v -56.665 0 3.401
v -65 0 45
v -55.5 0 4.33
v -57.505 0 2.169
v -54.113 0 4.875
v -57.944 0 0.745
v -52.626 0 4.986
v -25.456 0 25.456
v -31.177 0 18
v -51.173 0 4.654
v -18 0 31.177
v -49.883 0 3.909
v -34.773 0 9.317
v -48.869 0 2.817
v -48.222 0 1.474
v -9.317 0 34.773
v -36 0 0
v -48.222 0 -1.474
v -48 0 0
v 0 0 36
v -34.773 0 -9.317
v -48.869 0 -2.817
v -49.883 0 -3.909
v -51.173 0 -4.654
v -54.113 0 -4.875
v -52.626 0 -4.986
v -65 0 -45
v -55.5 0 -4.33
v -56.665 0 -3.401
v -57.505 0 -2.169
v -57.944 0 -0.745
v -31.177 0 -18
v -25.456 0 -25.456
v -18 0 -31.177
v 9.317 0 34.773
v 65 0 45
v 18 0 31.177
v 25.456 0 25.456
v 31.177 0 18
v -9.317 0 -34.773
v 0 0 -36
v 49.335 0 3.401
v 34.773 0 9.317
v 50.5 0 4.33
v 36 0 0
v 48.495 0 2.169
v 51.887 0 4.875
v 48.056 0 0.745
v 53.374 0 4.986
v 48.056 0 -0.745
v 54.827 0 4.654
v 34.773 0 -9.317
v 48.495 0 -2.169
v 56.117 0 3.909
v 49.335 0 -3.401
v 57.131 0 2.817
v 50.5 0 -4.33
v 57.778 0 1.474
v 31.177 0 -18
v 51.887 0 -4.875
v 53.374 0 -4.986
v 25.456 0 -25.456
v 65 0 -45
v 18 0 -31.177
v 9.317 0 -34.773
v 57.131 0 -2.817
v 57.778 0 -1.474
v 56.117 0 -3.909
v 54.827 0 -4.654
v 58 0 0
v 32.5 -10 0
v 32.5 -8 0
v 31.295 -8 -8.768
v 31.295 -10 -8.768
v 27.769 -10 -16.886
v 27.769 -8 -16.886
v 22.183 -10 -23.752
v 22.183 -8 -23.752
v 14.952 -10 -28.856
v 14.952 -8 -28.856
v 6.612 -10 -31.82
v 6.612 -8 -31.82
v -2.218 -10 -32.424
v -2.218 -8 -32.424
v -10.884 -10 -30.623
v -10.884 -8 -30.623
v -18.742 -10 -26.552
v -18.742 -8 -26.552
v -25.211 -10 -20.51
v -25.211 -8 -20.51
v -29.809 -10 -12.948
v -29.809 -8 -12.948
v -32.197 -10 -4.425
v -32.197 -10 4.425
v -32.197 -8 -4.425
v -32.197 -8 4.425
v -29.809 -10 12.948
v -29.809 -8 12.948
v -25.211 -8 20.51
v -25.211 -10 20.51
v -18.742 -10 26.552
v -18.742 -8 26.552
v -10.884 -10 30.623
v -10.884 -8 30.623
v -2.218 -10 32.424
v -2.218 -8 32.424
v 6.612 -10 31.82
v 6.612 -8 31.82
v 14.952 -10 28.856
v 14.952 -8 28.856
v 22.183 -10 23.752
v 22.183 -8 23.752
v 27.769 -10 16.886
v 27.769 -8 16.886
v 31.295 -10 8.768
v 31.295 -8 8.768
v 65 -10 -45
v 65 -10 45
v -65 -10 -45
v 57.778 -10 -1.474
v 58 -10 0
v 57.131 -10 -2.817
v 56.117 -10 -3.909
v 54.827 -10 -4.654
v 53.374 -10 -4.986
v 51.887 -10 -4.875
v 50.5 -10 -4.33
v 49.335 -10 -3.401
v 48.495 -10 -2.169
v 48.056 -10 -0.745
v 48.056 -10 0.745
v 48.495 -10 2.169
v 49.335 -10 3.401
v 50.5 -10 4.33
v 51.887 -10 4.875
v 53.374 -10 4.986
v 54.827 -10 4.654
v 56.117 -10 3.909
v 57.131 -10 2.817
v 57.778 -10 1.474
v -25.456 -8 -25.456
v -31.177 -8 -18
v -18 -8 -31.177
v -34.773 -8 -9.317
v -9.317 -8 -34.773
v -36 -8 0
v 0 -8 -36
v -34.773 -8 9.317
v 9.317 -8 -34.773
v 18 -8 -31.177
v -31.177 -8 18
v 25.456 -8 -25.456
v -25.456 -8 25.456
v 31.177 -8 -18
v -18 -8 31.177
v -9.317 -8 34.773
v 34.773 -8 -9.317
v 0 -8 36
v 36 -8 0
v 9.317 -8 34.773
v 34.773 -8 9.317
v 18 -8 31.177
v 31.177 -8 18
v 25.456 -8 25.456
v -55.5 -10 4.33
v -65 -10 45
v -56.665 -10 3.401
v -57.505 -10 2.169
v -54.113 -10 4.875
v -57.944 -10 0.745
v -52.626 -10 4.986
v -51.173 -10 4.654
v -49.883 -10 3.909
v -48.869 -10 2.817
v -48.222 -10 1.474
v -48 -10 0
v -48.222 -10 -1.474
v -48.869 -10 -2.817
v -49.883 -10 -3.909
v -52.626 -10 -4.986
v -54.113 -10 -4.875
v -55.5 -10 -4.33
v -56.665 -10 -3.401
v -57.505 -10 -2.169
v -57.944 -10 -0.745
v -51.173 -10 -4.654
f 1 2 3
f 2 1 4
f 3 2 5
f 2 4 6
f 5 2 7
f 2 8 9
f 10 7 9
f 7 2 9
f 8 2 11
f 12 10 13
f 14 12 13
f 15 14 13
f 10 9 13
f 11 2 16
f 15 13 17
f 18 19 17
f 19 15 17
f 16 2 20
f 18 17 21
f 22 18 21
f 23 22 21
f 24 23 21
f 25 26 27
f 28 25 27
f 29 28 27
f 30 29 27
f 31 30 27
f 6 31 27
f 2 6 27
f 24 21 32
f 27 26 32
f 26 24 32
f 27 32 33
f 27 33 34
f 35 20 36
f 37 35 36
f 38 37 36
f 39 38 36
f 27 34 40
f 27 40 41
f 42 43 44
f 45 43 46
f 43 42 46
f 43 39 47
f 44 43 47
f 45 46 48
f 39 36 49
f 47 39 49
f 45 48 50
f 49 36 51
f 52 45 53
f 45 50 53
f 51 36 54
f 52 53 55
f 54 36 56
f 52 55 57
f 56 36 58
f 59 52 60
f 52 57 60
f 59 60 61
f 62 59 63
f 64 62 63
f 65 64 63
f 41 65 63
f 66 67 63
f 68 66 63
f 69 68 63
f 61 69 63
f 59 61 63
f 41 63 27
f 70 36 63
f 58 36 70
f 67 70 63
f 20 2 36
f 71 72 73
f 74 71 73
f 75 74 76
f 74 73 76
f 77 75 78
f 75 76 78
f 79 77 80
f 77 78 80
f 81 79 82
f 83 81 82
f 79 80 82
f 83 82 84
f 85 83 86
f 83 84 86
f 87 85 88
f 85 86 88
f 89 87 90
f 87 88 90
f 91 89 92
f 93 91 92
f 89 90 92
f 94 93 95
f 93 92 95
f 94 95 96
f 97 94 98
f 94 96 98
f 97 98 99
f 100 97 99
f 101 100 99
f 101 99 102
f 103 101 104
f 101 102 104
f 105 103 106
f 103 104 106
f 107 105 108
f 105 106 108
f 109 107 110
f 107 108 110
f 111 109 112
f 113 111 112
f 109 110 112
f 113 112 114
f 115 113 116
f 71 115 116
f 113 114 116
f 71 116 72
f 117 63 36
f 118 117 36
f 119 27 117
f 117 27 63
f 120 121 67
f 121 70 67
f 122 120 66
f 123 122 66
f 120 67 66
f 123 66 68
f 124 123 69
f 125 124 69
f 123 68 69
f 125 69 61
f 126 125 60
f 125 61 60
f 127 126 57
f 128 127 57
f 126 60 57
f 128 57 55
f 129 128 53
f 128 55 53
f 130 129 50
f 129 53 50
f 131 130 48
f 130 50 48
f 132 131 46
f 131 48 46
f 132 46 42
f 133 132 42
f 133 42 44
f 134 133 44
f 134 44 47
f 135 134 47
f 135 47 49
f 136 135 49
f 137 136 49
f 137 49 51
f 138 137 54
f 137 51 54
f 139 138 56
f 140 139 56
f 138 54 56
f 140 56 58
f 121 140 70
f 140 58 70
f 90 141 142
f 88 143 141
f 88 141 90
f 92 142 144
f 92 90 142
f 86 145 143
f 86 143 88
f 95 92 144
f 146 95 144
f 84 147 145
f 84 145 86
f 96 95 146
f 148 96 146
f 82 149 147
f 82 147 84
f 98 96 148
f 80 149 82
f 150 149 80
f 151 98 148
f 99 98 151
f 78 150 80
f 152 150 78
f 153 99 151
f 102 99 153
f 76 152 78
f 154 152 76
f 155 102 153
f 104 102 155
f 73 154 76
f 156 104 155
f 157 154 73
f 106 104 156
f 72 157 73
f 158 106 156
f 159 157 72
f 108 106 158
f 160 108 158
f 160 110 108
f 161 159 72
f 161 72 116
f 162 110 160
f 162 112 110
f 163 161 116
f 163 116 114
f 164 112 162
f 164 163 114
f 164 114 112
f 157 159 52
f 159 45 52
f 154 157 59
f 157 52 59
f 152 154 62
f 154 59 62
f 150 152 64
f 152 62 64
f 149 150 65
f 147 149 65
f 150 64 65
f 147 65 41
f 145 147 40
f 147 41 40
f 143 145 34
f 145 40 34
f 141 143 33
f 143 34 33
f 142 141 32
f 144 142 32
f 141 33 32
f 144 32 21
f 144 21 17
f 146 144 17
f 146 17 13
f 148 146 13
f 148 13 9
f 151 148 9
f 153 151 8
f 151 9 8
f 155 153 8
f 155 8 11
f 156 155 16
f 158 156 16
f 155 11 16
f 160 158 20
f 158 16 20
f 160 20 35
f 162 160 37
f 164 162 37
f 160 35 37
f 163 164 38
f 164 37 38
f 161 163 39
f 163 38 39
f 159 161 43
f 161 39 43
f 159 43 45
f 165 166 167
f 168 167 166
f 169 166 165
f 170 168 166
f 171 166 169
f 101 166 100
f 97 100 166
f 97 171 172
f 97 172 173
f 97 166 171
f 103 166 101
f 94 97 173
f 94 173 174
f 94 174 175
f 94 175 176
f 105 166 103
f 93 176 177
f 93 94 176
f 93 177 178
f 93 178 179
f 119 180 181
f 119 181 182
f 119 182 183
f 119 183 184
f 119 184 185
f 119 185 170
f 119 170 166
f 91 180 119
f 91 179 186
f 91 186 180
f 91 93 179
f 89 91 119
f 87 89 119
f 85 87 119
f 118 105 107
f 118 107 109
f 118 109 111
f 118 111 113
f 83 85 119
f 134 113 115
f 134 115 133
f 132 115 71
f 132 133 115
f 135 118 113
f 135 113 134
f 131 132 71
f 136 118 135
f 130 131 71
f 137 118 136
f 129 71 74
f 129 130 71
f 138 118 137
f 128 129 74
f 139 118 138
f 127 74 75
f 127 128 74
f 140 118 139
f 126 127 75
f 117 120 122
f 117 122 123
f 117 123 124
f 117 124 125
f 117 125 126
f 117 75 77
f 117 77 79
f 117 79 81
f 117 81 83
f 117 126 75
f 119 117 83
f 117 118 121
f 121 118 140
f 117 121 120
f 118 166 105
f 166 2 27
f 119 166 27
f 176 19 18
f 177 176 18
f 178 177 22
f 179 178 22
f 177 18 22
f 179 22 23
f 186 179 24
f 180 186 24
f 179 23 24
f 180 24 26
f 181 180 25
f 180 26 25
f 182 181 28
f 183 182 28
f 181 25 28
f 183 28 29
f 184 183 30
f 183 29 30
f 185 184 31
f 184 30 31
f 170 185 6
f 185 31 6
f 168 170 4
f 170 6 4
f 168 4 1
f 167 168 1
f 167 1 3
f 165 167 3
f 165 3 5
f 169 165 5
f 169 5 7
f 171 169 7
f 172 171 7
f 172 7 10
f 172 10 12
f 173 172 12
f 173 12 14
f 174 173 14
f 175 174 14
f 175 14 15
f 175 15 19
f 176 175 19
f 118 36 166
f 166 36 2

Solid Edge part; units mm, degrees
sketch "Sketch1" plane through (0, 0, 0) normal (0, -1, 0) x (1, 0, 0)
  line L0 (65, -45) -> (65, 45)
  line L1 (65, 45) -> (-65, 45)
  line L2 (-65, 45) -> (-65, -45)
  line L3 (-65, -45) -> (65, -45)
extrude "Protrusion1" add sketch "Sketch1" along normal blind 10
sketch "Sketch2" plane through (0, 0, 0) normal (0, 1, 0) x (1, 0, 0)
  circle A0 centre (0, 0) radius 36
extrude "ExtrudedCutout_1" cut sketch "Sketch2" against normal blind 8
sketch "Sketch3" plane through (0, 0, 0) normal (0, 1, 0) x (1, 0, 0)
  circle A0 centre (-53, 0) radius 5
  circle A1 centre (53, 0) radius 5
  dimension "D1" = 72
  dimension "D2" = 10
  dimension "D3" = 10
  dimension "D4" = 12
  dimension "D5" = 12
extrude "Cutout1" cut sketch "Sketch3" against normal up to next
sketch "Sketch4" plane through (0, -8, 0) normal (0, 1, 0) x (1, 0, 0)
  circle A0 centre (0, 0) radius 32.5
extrude "Cutout2" cut sketch "Sketch4" against normal up to next
